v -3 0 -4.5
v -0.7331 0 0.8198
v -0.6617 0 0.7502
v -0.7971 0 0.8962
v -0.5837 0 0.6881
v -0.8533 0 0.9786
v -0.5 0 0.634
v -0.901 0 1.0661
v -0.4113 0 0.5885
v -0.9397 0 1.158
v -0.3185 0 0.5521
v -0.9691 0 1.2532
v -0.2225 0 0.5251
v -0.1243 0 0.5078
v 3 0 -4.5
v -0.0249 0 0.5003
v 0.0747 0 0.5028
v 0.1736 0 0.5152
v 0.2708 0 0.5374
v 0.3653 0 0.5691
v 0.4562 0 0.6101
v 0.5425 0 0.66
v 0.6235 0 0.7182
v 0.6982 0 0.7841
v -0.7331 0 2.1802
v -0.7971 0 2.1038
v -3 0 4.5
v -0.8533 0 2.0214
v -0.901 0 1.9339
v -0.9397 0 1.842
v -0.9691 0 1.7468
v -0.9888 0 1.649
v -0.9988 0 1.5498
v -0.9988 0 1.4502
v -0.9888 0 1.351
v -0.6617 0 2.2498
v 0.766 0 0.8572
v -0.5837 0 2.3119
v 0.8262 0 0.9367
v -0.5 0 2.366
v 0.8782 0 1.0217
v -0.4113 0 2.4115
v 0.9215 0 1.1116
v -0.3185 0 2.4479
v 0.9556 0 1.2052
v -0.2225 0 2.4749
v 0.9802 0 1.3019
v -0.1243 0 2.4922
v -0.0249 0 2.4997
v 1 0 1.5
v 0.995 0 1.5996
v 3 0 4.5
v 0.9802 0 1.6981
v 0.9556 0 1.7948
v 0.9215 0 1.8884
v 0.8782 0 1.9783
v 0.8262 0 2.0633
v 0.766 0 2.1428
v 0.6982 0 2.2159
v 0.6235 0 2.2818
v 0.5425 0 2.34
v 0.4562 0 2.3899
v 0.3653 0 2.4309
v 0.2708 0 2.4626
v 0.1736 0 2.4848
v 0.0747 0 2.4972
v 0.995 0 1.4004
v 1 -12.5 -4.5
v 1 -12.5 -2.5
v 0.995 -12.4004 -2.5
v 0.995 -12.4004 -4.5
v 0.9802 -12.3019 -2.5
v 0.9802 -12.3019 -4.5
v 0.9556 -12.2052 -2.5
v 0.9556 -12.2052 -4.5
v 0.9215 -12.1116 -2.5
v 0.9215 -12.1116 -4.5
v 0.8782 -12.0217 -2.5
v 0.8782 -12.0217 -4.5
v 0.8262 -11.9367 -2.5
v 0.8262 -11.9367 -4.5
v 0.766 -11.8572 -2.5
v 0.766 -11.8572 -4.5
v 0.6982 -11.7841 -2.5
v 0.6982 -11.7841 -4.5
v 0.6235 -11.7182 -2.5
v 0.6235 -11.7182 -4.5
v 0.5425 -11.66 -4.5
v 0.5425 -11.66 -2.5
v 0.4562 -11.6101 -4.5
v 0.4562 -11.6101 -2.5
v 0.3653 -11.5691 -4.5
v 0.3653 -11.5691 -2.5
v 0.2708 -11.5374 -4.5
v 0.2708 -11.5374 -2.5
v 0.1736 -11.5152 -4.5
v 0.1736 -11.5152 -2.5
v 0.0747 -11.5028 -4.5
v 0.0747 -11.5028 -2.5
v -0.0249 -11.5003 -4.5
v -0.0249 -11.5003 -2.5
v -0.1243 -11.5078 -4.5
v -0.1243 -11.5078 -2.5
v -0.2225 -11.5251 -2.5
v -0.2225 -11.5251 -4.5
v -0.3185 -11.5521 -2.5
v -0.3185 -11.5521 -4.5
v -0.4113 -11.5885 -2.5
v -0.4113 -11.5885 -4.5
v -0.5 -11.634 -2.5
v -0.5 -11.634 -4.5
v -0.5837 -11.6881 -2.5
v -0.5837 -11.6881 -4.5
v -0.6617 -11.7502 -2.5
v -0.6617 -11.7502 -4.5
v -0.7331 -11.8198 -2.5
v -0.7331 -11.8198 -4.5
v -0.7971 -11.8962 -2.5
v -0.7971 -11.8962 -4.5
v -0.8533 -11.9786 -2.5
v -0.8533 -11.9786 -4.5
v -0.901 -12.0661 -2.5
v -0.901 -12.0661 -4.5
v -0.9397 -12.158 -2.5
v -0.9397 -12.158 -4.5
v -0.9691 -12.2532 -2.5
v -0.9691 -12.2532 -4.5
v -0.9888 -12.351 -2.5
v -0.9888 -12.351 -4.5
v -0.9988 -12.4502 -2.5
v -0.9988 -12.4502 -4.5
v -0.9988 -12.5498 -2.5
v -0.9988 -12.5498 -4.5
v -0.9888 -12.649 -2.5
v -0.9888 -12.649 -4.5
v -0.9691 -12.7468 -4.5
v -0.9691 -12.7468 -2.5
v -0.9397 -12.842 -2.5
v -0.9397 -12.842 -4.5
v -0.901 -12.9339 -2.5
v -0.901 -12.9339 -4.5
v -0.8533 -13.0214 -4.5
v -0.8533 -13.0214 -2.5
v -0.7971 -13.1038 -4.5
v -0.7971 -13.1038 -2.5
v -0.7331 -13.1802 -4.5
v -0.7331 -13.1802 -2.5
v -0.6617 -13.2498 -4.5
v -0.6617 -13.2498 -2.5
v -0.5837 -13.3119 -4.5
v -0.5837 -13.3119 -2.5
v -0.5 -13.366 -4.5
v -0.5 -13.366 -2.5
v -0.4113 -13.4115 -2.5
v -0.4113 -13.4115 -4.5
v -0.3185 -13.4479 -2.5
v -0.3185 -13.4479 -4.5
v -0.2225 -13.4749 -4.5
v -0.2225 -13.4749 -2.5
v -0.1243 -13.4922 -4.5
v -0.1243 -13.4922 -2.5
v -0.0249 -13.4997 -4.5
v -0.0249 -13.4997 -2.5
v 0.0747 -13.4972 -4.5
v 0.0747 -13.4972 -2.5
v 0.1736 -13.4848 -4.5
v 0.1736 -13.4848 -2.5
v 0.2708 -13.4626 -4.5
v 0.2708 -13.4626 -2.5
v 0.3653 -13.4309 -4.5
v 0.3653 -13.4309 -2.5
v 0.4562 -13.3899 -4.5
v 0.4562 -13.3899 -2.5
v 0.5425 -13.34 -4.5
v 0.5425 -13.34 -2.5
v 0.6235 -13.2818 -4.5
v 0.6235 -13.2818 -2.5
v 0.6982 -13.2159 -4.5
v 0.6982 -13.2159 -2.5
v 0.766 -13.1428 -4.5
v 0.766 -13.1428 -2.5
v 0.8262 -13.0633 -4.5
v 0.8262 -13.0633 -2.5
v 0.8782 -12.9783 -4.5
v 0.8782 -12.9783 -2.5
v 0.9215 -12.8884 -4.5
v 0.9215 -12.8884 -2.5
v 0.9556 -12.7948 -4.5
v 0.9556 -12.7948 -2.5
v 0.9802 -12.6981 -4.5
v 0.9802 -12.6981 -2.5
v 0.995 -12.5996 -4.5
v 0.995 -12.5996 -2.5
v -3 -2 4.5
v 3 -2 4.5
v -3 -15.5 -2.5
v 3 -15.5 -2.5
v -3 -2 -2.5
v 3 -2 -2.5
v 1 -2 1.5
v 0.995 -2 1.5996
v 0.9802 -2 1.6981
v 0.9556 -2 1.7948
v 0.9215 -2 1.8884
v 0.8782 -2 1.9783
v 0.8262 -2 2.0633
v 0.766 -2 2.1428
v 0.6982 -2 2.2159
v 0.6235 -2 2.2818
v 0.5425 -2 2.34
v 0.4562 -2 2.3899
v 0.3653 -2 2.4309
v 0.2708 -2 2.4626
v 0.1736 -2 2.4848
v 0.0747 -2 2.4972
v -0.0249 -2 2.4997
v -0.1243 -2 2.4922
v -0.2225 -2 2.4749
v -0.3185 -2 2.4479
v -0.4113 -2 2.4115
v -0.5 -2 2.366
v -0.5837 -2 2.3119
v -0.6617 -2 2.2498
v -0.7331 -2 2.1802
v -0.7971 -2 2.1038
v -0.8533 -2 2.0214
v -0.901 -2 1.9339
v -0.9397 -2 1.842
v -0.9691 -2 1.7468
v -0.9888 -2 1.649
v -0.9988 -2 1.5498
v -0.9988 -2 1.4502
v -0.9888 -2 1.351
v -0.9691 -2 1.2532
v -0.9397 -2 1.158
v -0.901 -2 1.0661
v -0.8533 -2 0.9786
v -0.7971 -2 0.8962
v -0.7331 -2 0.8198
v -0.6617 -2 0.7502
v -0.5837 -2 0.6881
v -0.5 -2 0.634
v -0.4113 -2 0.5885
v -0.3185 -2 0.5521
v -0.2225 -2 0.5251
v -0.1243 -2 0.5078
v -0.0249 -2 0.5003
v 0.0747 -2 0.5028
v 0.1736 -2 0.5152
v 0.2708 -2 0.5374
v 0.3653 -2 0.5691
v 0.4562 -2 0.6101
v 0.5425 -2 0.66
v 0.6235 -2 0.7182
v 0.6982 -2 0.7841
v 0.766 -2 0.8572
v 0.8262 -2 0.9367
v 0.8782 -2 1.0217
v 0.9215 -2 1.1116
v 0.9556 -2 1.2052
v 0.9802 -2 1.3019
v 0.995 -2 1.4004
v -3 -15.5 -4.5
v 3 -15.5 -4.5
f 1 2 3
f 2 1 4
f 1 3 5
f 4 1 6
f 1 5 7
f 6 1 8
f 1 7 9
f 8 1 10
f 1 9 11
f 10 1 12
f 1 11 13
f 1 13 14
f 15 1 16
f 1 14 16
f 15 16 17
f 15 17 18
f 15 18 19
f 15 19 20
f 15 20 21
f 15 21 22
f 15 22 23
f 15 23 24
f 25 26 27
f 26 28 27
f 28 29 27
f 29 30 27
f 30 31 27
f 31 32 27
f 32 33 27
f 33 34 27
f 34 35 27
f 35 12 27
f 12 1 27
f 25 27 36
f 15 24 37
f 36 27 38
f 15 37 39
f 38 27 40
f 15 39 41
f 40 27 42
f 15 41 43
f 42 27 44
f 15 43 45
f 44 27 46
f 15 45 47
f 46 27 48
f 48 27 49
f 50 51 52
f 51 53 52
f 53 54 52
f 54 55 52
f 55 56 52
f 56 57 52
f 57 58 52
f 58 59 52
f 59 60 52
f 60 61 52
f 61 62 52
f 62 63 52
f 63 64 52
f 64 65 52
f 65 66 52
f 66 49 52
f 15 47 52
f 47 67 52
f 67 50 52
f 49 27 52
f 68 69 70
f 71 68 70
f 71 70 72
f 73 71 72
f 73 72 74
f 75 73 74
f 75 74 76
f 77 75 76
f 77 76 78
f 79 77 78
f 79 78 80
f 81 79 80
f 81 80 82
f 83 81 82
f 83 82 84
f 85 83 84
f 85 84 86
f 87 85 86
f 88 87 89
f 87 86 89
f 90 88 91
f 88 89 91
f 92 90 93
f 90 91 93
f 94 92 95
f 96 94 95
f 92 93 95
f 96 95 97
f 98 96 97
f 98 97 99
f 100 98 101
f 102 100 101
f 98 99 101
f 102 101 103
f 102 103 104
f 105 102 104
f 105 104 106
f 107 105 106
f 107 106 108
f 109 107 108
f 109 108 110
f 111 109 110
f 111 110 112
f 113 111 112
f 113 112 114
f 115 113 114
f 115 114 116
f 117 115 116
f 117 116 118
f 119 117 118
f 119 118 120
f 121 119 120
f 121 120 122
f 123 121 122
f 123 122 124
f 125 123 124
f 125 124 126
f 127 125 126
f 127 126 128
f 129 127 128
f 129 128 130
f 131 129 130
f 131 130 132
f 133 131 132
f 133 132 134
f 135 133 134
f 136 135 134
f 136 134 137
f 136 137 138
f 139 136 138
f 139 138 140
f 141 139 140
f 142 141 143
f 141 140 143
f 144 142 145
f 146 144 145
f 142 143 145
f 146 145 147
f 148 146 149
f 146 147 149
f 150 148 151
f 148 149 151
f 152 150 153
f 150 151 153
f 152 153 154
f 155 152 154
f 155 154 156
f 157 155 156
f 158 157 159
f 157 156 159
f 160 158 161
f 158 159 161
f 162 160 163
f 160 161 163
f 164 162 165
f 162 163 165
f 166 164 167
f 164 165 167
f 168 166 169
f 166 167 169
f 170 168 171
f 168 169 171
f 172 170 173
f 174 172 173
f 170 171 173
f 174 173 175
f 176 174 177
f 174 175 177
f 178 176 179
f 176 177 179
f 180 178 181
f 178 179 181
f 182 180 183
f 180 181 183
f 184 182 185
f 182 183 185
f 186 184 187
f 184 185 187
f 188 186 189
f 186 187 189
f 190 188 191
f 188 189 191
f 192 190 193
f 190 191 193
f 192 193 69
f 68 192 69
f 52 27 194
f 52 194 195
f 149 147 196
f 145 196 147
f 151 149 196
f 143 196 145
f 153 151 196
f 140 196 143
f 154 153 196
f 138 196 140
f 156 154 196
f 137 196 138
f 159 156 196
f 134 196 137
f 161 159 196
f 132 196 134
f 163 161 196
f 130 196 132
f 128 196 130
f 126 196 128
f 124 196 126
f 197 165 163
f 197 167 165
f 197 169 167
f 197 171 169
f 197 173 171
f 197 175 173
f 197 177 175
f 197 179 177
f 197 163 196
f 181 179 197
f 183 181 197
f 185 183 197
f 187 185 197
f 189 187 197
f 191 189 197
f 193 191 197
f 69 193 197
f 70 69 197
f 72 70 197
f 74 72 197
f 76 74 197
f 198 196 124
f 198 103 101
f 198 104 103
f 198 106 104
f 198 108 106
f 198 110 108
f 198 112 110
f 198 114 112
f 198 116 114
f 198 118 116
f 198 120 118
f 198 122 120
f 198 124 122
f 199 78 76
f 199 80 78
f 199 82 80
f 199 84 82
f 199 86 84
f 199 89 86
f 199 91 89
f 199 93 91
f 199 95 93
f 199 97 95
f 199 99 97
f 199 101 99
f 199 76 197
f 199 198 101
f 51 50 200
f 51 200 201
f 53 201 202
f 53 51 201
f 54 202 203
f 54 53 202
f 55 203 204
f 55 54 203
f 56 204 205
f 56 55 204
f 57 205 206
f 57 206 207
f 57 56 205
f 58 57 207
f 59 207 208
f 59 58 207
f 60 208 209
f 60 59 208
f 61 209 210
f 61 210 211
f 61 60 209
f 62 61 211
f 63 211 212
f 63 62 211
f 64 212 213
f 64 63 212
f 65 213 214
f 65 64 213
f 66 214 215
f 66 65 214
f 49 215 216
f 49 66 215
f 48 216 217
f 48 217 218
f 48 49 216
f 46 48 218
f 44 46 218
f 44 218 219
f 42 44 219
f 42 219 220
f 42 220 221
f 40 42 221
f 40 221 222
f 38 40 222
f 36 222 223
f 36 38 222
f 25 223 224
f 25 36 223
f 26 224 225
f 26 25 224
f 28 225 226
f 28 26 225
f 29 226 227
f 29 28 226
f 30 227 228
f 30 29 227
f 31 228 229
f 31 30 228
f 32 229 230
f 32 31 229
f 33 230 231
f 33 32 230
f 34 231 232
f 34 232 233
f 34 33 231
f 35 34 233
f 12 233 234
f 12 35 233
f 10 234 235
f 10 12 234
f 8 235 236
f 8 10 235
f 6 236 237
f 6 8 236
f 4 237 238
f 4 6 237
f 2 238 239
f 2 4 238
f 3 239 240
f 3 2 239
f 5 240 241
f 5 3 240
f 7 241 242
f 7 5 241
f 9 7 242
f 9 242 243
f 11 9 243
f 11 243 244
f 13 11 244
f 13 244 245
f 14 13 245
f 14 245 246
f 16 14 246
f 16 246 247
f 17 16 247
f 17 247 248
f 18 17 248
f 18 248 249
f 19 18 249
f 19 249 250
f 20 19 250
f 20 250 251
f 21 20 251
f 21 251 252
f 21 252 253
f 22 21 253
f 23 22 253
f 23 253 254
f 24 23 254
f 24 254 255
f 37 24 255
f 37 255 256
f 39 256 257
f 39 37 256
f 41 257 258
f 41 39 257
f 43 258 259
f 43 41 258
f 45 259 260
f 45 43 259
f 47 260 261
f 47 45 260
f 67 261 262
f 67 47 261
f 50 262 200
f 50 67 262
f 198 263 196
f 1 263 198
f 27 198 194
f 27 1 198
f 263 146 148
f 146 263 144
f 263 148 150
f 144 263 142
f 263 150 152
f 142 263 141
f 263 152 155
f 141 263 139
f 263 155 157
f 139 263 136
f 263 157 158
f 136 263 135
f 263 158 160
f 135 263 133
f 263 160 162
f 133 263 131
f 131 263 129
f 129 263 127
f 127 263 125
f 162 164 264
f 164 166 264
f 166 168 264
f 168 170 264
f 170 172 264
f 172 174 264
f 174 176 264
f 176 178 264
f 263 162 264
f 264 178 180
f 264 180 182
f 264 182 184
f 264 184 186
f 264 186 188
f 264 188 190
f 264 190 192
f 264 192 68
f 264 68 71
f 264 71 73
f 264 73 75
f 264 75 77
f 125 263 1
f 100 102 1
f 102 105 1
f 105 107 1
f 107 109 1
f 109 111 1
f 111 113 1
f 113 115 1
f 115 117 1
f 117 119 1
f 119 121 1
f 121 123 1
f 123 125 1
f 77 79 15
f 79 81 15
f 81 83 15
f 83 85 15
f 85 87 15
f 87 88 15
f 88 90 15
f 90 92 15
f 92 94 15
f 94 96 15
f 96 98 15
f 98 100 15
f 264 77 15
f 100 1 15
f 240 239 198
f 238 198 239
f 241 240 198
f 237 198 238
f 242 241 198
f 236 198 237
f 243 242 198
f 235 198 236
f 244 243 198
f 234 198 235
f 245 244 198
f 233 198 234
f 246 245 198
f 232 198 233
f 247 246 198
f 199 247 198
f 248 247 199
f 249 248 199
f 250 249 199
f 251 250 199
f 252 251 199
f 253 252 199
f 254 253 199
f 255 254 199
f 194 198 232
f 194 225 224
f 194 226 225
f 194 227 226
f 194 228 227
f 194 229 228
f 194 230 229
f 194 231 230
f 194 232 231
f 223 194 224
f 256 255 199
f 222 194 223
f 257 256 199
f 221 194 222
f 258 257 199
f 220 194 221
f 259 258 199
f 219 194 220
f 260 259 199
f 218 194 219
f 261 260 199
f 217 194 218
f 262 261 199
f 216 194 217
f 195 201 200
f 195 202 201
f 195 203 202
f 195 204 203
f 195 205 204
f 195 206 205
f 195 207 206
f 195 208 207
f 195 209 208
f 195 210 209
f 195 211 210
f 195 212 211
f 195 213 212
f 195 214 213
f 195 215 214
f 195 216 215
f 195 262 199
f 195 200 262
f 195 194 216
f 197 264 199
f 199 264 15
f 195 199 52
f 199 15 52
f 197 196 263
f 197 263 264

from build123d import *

# Parameters (mm, degrees)
F0_W     = 6
F0_H     = 9
F0_R     = 1
F1_DEPTH = 2
F2_W     = 6
F2_H     = 2
F3_DEPTH = 13.5
F4_R     = 1
F5_DEPTH = 25


with BuildPart() as f1:
    # F0 (on Front) → F1 (new body)
    with BuildSketch(Plane.XZ):
        Rectangle(F0_W, F0_H)
        with Locations((0, 1.5)):
            Circle(F0_R, mode=Mode.SUBTRACT)
    extrude(amount=F1_DEPTH)

    # F2 (on face) → F3 (join)
    with BuildSketch(Plane.XZ.offset(2)):
        with Locations((0, -3.5)):
            Rectangle(F2_W, F2_H)
    extrude(amount=F3_DEPTH)

    # F4 (on face) → F5 (cut)
    with BuildSketch(Plane.XY.offset(-2.5)):
        with Locations((0, -12.5)):
            Circle(F4_R)
    extrude(amount=-F5_DEPTH, mode=Mode.SUBTRACT)


solid = f1.part
